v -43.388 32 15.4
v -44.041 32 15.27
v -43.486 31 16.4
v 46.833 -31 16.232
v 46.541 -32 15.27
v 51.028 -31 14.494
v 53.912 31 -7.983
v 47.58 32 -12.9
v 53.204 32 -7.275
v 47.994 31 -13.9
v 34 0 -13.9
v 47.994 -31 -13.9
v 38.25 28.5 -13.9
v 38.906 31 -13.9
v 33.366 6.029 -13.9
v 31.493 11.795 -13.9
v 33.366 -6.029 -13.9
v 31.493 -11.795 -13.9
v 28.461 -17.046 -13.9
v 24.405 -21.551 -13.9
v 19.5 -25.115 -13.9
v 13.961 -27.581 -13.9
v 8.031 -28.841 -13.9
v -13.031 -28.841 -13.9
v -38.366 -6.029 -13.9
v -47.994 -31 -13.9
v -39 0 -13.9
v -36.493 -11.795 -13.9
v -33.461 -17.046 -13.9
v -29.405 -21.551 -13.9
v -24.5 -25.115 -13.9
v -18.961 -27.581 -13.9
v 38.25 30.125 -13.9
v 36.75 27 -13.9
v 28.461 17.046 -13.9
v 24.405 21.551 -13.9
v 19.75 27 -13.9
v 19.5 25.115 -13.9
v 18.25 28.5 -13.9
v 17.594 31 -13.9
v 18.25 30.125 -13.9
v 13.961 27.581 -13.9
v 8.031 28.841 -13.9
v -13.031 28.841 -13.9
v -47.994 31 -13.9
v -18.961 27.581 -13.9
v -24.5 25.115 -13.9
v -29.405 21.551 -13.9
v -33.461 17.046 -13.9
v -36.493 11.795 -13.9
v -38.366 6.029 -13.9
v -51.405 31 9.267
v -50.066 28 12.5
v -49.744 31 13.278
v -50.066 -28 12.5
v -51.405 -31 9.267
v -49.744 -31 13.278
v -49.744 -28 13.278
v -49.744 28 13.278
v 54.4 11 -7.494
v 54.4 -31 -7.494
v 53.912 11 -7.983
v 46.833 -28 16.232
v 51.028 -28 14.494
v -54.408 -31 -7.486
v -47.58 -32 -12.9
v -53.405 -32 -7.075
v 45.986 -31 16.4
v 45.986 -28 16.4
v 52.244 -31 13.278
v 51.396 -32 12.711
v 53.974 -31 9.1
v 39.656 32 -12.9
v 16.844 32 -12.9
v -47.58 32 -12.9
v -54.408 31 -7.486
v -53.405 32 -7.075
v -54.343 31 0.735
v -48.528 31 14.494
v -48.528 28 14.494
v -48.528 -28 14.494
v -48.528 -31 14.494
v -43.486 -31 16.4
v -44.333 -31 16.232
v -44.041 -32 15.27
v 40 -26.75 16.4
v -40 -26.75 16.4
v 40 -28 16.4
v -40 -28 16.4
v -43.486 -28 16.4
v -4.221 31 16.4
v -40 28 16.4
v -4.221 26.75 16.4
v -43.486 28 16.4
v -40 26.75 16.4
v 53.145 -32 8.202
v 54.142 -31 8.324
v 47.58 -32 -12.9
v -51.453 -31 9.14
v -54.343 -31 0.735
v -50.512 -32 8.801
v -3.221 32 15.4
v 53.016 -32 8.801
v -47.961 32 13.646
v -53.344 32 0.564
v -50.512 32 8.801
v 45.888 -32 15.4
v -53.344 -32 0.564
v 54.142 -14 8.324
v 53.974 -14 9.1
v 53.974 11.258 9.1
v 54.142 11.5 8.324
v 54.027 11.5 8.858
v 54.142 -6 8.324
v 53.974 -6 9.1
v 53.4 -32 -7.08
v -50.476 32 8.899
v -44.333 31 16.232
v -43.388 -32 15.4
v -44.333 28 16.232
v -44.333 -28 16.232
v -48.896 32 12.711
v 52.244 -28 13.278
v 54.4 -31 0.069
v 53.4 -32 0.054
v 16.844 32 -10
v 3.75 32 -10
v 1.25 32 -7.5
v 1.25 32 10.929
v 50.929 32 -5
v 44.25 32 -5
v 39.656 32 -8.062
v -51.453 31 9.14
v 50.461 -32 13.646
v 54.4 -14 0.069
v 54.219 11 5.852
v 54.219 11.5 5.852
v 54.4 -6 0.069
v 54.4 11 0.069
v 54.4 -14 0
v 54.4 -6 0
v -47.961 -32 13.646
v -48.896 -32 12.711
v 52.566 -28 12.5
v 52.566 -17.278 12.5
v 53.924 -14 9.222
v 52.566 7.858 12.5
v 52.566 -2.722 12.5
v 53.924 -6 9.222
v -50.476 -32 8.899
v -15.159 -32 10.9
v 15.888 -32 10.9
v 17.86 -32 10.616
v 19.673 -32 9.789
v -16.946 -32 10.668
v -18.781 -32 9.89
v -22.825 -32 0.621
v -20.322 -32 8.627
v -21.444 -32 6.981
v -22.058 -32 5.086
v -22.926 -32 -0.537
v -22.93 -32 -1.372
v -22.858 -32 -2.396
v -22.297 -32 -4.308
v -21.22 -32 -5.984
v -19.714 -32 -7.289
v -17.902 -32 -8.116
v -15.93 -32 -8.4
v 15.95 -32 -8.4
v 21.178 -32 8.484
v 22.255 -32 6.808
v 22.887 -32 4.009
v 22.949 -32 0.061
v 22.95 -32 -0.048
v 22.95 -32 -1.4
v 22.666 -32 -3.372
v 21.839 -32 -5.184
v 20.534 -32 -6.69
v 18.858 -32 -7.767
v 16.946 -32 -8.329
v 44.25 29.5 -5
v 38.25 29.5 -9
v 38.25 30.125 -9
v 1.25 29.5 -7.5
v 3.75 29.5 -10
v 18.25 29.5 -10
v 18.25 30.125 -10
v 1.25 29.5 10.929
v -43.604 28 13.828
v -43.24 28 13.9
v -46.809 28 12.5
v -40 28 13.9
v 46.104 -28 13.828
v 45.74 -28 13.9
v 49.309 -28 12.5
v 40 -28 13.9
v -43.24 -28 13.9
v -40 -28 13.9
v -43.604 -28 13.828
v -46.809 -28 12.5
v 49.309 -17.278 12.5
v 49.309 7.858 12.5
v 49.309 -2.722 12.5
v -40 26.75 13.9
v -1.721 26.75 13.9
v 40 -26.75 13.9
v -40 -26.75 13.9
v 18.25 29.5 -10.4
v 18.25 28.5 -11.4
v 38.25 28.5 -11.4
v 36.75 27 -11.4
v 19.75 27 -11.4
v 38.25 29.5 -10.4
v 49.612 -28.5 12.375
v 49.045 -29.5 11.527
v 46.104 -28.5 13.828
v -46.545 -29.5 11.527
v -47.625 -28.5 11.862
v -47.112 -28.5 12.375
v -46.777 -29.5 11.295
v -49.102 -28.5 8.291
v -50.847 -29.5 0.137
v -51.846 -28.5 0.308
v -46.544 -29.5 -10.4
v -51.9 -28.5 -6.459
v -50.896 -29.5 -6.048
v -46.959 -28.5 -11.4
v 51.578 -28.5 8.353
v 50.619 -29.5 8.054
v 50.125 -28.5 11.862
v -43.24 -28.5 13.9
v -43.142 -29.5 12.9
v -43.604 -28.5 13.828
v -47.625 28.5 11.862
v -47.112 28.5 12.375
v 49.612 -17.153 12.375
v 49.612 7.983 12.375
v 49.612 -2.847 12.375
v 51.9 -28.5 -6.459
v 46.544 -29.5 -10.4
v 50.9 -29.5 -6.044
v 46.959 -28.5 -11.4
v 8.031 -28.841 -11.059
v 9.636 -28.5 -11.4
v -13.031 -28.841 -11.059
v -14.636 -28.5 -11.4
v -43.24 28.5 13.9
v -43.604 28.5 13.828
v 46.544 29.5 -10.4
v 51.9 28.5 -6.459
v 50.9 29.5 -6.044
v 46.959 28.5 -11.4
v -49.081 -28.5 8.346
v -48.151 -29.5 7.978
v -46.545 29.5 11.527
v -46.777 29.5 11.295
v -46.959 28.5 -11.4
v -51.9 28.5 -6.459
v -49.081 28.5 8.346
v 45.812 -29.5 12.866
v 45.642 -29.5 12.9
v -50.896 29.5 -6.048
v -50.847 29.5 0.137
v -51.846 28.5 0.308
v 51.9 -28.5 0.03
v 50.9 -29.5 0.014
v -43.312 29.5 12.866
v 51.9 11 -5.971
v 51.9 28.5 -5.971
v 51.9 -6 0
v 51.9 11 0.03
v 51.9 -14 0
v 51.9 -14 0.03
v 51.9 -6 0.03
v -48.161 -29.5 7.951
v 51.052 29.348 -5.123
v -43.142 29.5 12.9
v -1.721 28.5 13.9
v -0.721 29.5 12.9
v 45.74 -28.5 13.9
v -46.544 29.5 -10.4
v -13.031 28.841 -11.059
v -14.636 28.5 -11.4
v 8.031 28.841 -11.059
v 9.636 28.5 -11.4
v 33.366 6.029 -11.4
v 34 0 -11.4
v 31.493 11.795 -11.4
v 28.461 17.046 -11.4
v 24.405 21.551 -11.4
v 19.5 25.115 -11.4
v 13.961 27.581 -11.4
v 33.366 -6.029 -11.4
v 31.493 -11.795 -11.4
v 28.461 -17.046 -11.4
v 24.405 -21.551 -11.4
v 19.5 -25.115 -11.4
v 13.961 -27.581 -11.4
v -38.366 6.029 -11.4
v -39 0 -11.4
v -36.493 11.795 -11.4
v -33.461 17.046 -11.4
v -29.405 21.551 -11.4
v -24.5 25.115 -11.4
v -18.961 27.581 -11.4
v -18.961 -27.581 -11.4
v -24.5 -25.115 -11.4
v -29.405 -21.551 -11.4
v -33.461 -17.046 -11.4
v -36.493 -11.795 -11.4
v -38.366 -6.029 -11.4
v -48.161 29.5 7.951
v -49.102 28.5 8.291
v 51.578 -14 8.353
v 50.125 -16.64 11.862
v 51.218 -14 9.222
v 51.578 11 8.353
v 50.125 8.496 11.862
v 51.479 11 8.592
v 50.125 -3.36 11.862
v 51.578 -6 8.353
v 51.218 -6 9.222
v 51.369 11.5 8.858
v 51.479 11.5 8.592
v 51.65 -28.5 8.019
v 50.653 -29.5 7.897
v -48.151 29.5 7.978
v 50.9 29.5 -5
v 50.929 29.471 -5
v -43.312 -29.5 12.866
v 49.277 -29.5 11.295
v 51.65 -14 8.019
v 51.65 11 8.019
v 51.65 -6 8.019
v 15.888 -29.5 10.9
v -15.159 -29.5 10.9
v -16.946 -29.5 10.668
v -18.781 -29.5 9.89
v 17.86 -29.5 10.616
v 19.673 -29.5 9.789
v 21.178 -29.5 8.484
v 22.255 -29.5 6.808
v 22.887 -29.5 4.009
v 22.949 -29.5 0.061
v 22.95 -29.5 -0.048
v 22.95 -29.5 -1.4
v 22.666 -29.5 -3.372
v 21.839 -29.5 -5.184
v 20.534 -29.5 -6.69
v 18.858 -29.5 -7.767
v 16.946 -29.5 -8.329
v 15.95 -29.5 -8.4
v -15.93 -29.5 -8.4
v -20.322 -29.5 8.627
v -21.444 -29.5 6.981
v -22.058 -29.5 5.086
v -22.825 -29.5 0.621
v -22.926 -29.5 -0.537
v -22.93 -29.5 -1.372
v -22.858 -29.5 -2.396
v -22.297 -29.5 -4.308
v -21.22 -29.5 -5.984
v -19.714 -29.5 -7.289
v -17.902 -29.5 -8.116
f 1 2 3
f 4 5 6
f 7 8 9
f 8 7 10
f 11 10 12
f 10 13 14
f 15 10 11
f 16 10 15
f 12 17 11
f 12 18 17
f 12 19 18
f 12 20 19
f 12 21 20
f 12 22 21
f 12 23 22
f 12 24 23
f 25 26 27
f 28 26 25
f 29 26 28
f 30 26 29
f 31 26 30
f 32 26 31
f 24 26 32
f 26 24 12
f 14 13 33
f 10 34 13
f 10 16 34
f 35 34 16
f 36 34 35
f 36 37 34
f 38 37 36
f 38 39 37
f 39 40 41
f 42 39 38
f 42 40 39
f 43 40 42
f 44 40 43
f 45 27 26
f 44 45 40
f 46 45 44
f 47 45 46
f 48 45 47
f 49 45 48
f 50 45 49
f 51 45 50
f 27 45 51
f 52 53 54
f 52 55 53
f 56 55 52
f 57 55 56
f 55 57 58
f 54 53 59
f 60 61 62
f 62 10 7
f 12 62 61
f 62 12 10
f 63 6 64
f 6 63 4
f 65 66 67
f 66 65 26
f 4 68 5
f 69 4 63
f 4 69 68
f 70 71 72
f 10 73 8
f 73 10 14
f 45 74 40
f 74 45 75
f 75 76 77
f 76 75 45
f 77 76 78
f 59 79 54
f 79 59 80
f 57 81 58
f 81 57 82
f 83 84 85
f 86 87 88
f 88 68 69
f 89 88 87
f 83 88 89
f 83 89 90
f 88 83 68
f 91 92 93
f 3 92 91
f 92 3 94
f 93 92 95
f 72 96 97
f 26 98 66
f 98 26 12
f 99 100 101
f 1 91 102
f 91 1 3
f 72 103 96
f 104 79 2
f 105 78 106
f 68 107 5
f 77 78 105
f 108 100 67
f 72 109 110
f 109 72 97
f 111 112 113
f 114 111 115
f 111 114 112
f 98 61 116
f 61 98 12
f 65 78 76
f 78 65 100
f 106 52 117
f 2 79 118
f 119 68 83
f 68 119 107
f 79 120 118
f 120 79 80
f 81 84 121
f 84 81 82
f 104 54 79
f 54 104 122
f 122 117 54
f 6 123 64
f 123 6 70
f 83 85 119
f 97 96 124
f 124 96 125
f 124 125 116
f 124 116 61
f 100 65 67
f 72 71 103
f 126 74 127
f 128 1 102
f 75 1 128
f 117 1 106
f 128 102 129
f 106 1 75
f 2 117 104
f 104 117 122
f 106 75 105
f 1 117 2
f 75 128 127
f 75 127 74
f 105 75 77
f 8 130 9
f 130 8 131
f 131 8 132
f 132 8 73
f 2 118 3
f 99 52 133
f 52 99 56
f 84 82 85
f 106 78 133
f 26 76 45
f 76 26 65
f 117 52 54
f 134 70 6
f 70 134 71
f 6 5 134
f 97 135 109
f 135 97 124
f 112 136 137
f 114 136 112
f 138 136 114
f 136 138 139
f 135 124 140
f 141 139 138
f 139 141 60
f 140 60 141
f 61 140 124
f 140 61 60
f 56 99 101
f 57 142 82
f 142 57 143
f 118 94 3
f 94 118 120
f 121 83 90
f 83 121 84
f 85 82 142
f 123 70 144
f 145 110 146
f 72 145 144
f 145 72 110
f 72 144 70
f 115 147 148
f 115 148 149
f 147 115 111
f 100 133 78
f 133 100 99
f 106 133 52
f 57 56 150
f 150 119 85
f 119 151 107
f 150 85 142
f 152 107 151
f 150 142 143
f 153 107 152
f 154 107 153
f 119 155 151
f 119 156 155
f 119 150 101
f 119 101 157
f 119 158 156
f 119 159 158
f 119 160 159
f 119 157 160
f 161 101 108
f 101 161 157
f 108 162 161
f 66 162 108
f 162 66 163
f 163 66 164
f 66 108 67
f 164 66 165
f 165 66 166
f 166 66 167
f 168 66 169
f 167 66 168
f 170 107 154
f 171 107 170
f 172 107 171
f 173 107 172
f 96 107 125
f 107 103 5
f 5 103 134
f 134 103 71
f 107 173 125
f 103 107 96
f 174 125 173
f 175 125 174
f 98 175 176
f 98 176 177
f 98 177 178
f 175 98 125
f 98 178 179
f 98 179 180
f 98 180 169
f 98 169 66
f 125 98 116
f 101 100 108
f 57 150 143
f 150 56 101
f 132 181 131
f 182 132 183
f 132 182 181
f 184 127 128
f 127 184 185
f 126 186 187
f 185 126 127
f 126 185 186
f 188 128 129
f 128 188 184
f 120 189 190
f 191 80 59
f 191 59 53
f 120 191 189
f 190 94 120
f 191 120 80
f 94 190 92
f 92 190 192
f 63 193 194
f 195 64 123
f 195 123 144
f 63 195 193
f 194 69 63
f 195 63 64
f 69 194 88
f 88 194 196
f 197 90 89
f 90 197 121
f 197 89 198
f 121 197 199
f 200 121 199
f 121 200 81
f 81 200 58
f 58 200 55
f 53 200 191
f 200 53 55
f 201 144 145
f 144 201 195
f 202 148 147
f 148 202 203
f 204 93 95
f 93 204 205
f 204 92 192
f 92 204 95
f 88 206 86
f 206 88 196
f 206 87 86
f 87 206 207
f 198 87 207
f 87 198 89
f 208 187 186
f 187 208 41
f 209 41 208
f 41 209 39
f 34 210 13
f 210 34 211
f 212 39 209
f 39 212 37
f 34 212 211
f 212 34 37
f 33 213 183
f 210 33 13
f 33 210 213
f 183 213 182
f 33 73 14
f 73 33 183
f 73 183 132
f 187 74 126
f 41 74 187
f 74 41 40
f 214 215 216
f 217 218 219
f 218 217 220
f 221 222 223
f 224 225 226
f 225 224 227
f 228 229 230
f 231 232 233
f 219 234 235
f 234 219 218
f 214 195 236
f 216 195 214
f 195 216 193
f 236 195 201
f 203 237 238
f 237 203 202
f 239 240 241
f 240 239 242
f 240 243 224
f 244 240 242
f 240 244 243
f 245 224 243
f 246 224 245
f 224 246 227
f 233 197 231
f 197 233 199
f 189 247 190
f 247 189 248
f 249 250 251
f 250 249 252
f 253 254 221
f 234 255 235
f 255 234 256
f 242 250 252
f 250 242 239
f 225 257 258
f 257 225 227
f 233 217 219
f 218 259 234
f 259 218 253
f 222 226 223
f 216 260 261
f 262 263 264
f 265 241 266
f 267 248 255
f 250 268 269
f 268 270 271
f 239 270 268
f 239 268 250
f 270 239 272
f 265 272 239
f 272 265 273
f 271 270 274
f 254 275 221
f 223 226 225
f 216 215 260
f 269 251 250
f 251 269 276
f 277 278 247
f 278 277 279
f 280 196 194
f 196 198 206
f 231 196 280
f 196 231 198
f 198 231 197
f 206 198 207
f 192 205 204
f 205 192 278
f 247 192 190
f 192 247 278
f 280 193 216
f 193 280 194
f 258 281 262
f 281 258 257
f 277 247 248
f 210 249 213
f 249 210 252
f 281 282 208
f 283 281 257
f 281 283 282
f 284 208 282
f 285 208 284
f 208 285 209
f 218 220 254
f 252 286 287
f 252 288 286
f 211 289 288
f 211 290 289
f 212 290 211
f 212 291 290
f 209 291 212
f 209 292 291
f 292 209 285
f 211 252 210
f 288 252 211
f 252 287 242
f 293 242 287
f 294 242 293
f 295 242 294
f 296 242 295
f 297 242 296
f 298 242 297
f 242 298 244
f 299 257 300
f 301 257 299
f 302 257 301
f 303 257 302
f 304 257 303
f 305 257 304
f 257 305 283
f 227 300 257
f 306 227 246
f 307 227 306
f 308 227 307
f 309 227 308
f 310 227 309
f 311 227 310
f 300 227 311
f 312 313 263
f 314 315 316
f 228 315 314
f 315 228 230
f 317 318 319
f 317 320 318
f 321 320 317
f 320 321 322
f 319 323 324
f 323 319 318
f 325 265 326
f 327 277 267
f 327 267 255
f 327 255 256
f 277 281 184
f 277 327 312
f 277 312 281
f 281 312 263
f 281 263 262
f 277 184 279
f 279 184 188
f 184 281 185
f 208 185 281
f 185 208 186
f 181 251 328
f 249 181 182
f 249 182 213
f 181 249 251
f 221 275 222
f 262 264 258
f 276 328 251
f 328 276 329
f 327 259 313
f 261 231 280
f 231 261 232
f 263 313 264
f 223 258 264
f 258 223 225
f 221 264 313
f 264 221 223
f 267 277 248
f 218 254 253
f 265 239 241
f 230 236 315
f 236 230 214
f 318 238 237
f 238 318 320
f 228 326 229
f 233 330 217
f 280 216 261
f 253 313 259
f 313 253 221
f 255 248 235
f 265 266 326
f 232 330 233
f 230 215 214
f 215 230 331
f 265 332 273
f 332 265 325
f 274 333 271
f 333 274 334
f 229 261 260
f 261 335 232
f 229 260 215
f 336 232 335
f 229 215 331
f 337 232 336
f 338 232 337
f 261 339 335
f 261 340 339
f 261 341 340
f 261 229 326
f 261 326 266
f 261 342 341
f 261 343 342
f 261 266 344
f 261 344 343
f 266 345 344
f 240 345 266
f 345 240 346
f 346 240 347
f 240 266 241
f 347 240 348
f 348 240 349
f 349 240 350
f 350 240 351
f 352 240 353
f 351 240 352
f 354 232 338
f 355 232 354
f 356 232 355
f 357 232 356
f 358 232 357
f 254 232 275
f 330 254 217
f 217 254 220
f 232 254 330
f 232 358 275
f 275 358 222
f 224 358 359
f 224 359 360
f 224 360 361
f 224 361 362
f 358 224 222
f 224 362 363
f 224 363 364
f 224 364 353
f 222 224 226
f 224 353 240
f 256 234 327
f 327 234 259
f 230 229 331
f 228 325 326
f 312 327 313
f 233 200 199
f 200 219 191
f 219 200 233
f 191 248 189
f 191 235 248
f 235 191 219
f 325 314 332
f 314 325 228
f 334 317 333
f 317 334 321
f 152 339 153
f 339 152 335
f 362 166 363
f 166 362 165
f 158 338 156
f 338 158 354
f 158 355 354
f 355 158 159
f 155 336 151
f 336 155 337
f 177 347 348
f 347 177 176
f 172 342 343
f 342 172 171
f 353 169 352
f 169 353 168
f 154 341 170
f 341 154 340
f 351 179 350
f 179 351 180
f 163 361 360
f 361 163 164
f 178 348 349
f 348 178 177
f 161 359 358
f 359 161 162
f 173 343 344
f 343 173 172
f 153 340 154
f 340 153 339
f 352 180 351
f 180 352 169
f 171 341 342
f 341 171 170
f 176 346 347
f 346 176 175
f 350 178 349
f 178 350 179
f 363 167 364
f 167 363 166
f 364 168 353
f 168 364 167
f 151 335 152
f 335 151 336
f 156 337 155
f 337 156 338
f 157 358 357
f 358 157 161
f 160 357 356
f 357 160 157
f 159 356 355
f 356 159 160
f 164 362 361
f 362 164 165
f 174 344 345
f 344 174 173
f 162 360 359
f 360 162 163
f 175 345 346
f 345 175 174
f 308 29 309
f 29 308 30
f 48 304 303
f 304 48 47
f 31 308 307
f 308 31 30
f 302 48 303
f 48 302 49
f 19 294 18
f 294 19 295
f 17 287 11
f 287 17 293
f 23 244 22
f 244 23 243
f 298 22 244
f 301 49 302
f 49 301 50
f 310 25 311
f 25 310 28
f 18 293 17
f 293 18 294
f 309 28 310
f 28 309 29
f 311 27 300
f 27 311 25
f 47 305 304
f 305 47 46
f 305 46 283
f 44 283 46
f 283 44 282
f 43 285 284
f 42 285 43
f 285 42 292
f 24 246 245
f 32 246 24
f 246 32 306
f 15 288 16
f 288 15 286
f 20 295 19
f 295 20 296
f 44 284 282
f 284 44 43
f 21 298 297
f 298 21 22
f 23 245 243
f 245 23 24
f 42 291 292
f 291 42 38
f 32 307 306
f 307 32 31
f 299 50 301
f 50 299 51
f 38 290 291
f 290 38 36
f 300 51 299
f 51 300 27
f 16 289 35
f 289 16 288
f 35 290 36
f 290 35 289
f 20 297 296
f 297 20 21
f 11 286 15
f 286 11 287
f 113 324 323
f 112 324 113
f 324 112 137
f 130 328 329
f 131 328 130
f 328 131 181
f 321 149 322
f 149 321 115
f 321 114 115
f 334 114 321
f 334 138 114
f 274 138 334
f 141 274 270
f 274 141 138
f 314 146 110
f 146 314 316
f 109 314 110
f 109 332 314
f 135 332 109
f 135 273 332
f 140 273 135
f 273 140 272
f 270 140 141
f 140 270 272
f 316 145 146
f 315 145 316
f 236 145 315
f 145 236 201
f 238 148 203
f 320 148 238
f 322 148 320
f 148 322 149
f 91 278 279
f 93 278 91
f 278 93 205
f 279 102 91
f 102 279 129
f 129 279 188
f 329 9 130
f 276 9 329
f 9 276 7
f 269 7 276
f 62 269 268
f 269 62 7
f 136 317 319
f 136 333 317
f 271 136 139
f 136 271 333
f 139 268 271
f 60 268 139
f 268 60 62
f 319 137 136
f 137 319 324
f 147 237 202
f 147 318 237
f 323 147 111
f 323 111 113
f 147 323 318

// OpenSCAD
// file: polyround2019.scad
//p=mirrorPolyline([[-1,-4,11,4],[-10,0,14,4],[-12,20,20,4],[-20,50,40,4],[-20,80,40,4],[-20,110,30,4],[-10,100,0,4],[-10,0,0,5],[-20,5,5,4],[-20,5,16,2],[-10,4,12,4] ]);

//polyline(p);
// 
//
// color ("yellow")polyline (polyRound(let(ip=([for (i=[0:3])[rnd(0,30),rnd(0,100),rnd(0,30),2+rnd(2)] ]))
//     mirrorPolyline([for(i=[0:0.5:len(ip)-1]) i==floor(i)?ip[i]: ip[i]+
//     [
// floor(rnd(2))==0? 0:max(0,rnd(10,20)*sign(rnd(-1,1))),
// floor(rnd(6))==0? 0:rnd(10,20)*sign(rnd(-1,1)),
// floor(rnd(2))==0? 0.01:rnd(10,20)*sign(rnd(-1,1)),
// 0(0,30),2+rnd(2)] ]))
//     mirrorPolyline([for(i=[0:0.5:len(ip)-1]) i==floor(i)?ip[i]: ip[i]+
//     [
// floor(rnd(2))==0? 0:max(0,rnd(10,20)*sign(rnd(-1,1))),
// floor(rnd(6))==0? 0:rnd(10,20)*sign(rnd(-1,1)),
// floor(rnd(2))==0? 0.01:rnd(10,20)*sign(rnd(-1,1)),
// 0
// ]  ])) ,2.5);
// ]  ])) ,1.5);
// 
// color ("darkgrey")polyline (polyRound(let(ip=([for (i=[0:2])[rnd(0,30),rnd(0,100),rnd


function polyRound(radiipoints,fn=5)=
// reworte most of it all here heavily use of wrap function
let(p=getpoints(radiipoints)) 
let(r=getradii(radiipoints))
let(Lp1=last(p),Lp=Lp1+1) 
let(
temp=[for(i=[0:last(p)]) 
round3points(
[ p[wrap(i-1,Lp,0)], p[wrap(i  ,Lp,0)], p[wrap(i+1,Lp,0)]],
r[i],
fn)])   //common trick  to flatten a list of list
[for (a = temp )        for (b = a) b];






 
 


function round3points(v,r,fn=6)=let(
p0=v[0],p1=v[1],p2=v[2],
n01=un(p0-p1),
n21=un(p2-p1),
planeNormal=un(cross(n21,n01)),
 

midLineNormal=un(n01 +n21),
 
angle=angle(n21,n01),
tanD=r /sin(angle/2),
 
center=p1+  midLineNormal*( tanD)
 

)
concat(
 [ for(i=[-.5:1/fn:.5])
    
center+ rotateAxis(   -midLineNormal*r ,planeNormal,(-i)*angle +180*i )    
] );

 
function angle (a,b)=atan2(sqrt((cross(a,b)*cross(a,b))),(a* b));
function dot(v1,v2) = v1[0]* v2[0]+ v1[1]* v2[1]+ v1[2]* v2[2];
function dot4(v1,v2) = v1[0]* v2[0]+ v1[1]* v2[1]+ v1[2]* v2[2]+ v1[3]* v2[3];

function point2plane(p,o,n) =
let (v = o - p) p + (n * (v.x * n.x + v.y * n.y + v.z * n.z)); //proj ap to a plane
function dist_point2plane(p,o,n) =
let (v = p-o) ( (v.x * n.x + v.y * n.y + v.z * n.z)); //proj ap to a plane
function mirrorPolyline(v)= [each v, each rev([for (i=v)[-i.x,i.y,i.z,i[3]]])] ;

function v3(p) = [p.x,p.y,p.z]; // vec3 formatter
function rev(v) = [for (i = [len(v) - 1: -1: 0]) v[i]];
function avrg(l) = len(l) > 1 ? addl(l) / (len(l)) : l;
function avrgp(l) = len(l) > 1 ? addlp(l) / (len(l)) : l;
function addlp(v,i=0,r=[0,0,0]) = i<len(v) ? addlp(v,i+1,r+v[i]) : r;
function lerp(start,end,bias) = (end * bias + start * (1 - bias));
function un(v)=assert (is_list(v)) v/max(norm(v),1e-64) ;
function rndc(a = 1,b = 0,s = [])=[rnd(a,b,s),rnd(a,b,s),rnd(a,b,s)];
function rnd(a = 1,b = 0,s = []) =
s == []?(rands(min(a,b),max(a,b),1)[0]) :(rands(min(a,b),max(a,b),1,s)[0]);
function getpoints(p)=[for(i=p)[i.x,i.y,i.z]];// gets [x,y]list of[x,y,r]list
function getradii(p)= [for(i=p)is_num(i[3])? i[3]: 0 ]; // gets [r]list of[x,y,r]list
function wrap(x,x_max=1,x_min=0) = (((x - x_min) % (x_max - x_min)) + (x_max - x_min)) % (x_max - x_min) + x_min; // wraps numbers inside boundaries
function last(i)=len(i)-1;// shorthand sugar for len(i)-1

module polyline(p,r=1) {for(i=[0:max(0,len(p)-2)])line(p[i],p[wrap(i+1,len(p) )],r);}

module polyline_open(p,r=1) {
     if (len(p)-1>1)
     for(i=[0:max(0,len(p)-2)])line(p[i],p[   i+1],r);
} // polyline plotter

module line(p1,p2 ,width=1) 
{ // single line plotter
hull() {
translate(v3(p1)) sphere(width);
translate(v3(p2)) sphere(width);
}
}

module 3dcircle(r,n)
{
axis=cross([0,0,1],n);
theta=angle ([0,0,1],n);
rotate (theta,axis) circle(r);
}


 function rotateAxis(point,axis,angle)=RotateQuat(BuildQuat(axis,angle), point);

function  /*vec4*/  NormQuat(/*vec4*/q)=
 let(     lenSQ =  dot4(q, q),     invLenSQ = 1./lenSQ)     q*invLenSQ;
 

function /*vec4*/ BuildQuat(/*vec3*/  axis,   angle)= 
     NormQuat(concat(axis *sin(angle*0.5),[ cos(angle*0.5)]));


 function /*vec3*/RotateQuat(/*vec4*/q, /*vec3*/v)=
let(    /*vec3*/ t = 2.*cross([q.x,q.y,q.z], v)     )    v + q[3]*t + cross([q.x,q.y,q.z], t);




//
// function /*vec4*/MulQuat(/*vec4*/q1, /*vec4*/q2)=
//{
//    /*vec4*/res = vec4(0.);
//    res.w   = q1.w*q2.w - dot(q1.xyz, q2.xyz);
//    res.xyz = q1.w*q2.xyz + q2.w*q1.xyz + cross(q1.xyz, q2.xyz);
//     NormQuat(res);
//}
//
// 
//    
//
//
function fromTo(/*vec3*/p,/*vec3*/q)=
 
 acos(dot(p,q));

 
// function /*vec4*/quatLookAt(/*vec3*/forward,/*vec3*/up){
//    forward=normalize(forward);
//    up=normalize(up);
//  (BuildQuat(cross(forward,up),fromTo(forward,up)));
//}
//
//
// function /*vec4*/quatInv(in /*vec4*/q)=
//{
//     vec4(-q.xyz, q.w);
//}
// main file
    include<polyround2019.scad>
cage=false;
//cage=true;
c1=17.5/2+1;
c2=4+1;
c3=59;
hc3=58/2;
l1=102/2-c1;
l2=102/2-c2*1.5+1;
l3=(24-c1*2)+c2-1.5;
fxtra=0;
shell=2.5;
wl1=l1+c1*1;
wl3=l3+c2/2+1;
wl3f=l3+c2/2+1+fxtra;
whc3=hc3+1.5;
r=4;
r2=10;
slit =false;
     path=  polyRound( [
     [ wl1-10,wl3f,whc3,3],
    [ wl1,wl3f,whc3,3], 
   [ wl1,wl3f,-whc3,r],  [wl1,-wl3,-whc3,r2], [-wl1,-wl3,-whc3,r2],
     [-wl1,wl3f,-whc3,r],[-wl1,wl3f,whc3,r],  
      [-wl1,-wl3,whc3,r2], 
     [ wl1-47,-wl3,whc3,r2], 
     [ wl1-47,wl3f,whc3,3], 
//     [ wl1-35,wl3f,whc3,3],   
//     [ wl1-35,wl3f,whc3-10,3],   
      
    ]
  ,fn=4);
  
  
       path2=   ( [
       [0, 0, 30], [0, 20, 30], 
       [21.2132, 20, 21.2132]       ,[21.2132, 0, 21.2132]       ,
       [30, 0, 0],    [30, 20, 0], 
       [21.2132, 20, -21.2132],        [21.2132, 0, -21.2132], 
       [0, 0, -30],   [0, 20, -30],
       [-21.2132, 20, -21.2132],  [-21.2132, 0, -21.2132], 
       [-30, 0, 0],[-30, 20, 0],
       [-21.2132, 20, 21.2132],        [-21.2132, 0, 21.2132], 
      [0, 00, 30], 
       
       ]*1.03
       
   );
//       echo(path2);
//*difference(){
//    union(){
//translate([0,-29,0])    rotate([0,90/4+0,0]) translate([0,l2 ,0])    polyline(path2,4);
//translate([0,10.5,0])rotate([-90,0,0])cylinder(8,hc3+6,hc3+6);
//    }
//translate([0,0,0])rotate([-90,0,0])cylinder(60,hc3,hc3);
//
//}
rotate([-90,0,0])difference(){
union(){
difference(){
hull(){
    linear_extrudeSH(c3+shell*2, $convexity=100,center=true) offset(delta=shell,$fn=1)topprofile();
//  translate([0,fxtra,0])  linear_extrudeSH(c3+shell*2, $convexity=100,center=true) offset(shell,$fn=1)topprofile();
    }
hull(){
    translate([l1-21,-10,hc3+shell-2])// top notch1
       cube([33,40,shell*3.6-3+3],center=true);
    translate([l1-21,-10,hc3+shell-2])// top notch1
       cube([38,35,shell*3.6-3+3],center=true);
    translate([l1-16,-15,hc3+shell-2])// top notch1
       cube([38,40,shell*3.6-3+3],center=true);}
    
//     #translate([l1-17,-15,hc3+shell]) rotate([0,0,45]) cube([40,20,80],center=true);// chamfer
}
        
//translate([0,0,0])hull()
//{
//        linear_extrudeSH(c3+shell*2, $convexity=100,center=true) offset(shell)topprofile();
//
// translate([-20,0,0])rotate([-90,0,0])cylinder(21,hc3+2.5,hc3+2.5);
//translate([20,0,0])rotate([-90,0,0])cylinder(21,hc3+2.5,hc3+2.5);
//     translate([-20,0,0])rotate([-90,0,0])cylinder(22,hc3+1,hc3+1);
//translate([20,0,0])rotate([-90,0,0])cylinder(22,hc3+1,hc3+1);
//}
if(cage)translate([0,-c2+2 ,0 ])polyline(path,4.1);
}


   translate([l1-13 ,0,hc3+shell])// top notch
hull(){
    cube([20-3,40-3,shell*3.6],center=true);
   cube([20,40,shell*3.6-3],center=true);
}   

translate([l1-13 ,0,hc3+shell+shell*1.25])// top notch
 hull(){
    cube([23-3,43-4,shell*3.6],center=true);
   cube([23,43,shell*3.6-4],center=true);
}

    
linear_extrudeSH(c3, $convexity=100,center=true) topprofile();
translate([0,0,-hc3])linear_extrudeSH(shell*34, $convexity=100,center=true) offset(7)offset(-10)scale([.5,1])topprofile();


if(slit)translate([-90,-.5,-hc3+1])linear_extrudeSH(2, $convexity=100 ) topprofile();// slit
//mirror([0,0,1])translate([-90,-4,-hc3+1])linear_extrudeSH(2, $convexity=100 ) topprofile();

 
//union( convexity=100){
//linear_extrude(2, $convexity=100) offset(3)  topprofile();
//translate([0,0,c3*2+3])linear_extrude(2, $convexity=20) offset(3)  topprofile();
//linear_extrude(c3*2+4, convexity=100)
//
//difference()
//{
// offset(2)   topprofile();
//    topprofile();
//}
//}

    
    
translate([0,0,0])hull()
{
 translate([-10,0,0])rotate([-90,0,0])cylinder(25,hc3,hc3);
translate([5,0,0])rotate([-90,0,0])cylinder(25,hc3,hc3);
}

 
translate([0,-20,0]) difference(){
    cube([120,15,56],center=true);// display
translate([-15,-0,28])     cube([50,15,2.5],center=true);// display
translate([-0,-0,-28])     cube([80,15,2.5],center=true);// display

}


//translate([l1-8,-10,hc3+shell])// top notch
//hull(){
//    cube([42-3,40-3,shell*3.6],center=true);
//   cube([42,40,shell*3.6-3],center=true);
//}
 translate([l1,-15,hc3+shell])  cube([40,40,40],center=true);
 translate([l1,-15,-10])  cube([40,30,8],center=true);
 translate([l1,-13,-10]) rotate([45,0,0]) cube([40,11,11],center=true);
 if(!cage) translate([l1-35,-13,hc3]) rotate([0,0,45]) cube([40,10,10],center=true);
 if(!cage) translate([l1+c1,-2,hc3]) rotate([0,0,45]) cube([40,10,36],center=true);
 translate([l1,-3-20,hc3+shell-20]) rotate([-45,0,0]) cube([40,20,40],center=true);// chamfer


}
function clamp(v,a=0,b=1)=min(max(v,min(a,b)),max(1,b));


module topprofile(){
    offset(-.1,$fn=1)hull(){
     offset(1,$fn=1)
hull(){
translate([l1,0])  circle(c1,$fn=8);
translate([-l1,0])  circle(c1,$fn=8);
 

translate([c2*.25,-l3])
 {
translate([l2,0])  circle(c2,$fn=8);
translate([-l2,0])  circle(c2,$fn=8);
}




} 
translate([0,c2+1.5]) 
 {
translate([l2+c2/2,0])  circle(c2,$fn=4);
translate([-l2-c2/2,0])  circle(c2,$fn=4);
}
}
}

module linear_extrudeSH(h,convexity=100,center )
{
    hull(){
    linear_extrude(h-2, $convexity=convexity,center=center) children();
    linear_extrude(h , $convexity=convexity,center=center) offset(r=-1  )children();

    }
    }
